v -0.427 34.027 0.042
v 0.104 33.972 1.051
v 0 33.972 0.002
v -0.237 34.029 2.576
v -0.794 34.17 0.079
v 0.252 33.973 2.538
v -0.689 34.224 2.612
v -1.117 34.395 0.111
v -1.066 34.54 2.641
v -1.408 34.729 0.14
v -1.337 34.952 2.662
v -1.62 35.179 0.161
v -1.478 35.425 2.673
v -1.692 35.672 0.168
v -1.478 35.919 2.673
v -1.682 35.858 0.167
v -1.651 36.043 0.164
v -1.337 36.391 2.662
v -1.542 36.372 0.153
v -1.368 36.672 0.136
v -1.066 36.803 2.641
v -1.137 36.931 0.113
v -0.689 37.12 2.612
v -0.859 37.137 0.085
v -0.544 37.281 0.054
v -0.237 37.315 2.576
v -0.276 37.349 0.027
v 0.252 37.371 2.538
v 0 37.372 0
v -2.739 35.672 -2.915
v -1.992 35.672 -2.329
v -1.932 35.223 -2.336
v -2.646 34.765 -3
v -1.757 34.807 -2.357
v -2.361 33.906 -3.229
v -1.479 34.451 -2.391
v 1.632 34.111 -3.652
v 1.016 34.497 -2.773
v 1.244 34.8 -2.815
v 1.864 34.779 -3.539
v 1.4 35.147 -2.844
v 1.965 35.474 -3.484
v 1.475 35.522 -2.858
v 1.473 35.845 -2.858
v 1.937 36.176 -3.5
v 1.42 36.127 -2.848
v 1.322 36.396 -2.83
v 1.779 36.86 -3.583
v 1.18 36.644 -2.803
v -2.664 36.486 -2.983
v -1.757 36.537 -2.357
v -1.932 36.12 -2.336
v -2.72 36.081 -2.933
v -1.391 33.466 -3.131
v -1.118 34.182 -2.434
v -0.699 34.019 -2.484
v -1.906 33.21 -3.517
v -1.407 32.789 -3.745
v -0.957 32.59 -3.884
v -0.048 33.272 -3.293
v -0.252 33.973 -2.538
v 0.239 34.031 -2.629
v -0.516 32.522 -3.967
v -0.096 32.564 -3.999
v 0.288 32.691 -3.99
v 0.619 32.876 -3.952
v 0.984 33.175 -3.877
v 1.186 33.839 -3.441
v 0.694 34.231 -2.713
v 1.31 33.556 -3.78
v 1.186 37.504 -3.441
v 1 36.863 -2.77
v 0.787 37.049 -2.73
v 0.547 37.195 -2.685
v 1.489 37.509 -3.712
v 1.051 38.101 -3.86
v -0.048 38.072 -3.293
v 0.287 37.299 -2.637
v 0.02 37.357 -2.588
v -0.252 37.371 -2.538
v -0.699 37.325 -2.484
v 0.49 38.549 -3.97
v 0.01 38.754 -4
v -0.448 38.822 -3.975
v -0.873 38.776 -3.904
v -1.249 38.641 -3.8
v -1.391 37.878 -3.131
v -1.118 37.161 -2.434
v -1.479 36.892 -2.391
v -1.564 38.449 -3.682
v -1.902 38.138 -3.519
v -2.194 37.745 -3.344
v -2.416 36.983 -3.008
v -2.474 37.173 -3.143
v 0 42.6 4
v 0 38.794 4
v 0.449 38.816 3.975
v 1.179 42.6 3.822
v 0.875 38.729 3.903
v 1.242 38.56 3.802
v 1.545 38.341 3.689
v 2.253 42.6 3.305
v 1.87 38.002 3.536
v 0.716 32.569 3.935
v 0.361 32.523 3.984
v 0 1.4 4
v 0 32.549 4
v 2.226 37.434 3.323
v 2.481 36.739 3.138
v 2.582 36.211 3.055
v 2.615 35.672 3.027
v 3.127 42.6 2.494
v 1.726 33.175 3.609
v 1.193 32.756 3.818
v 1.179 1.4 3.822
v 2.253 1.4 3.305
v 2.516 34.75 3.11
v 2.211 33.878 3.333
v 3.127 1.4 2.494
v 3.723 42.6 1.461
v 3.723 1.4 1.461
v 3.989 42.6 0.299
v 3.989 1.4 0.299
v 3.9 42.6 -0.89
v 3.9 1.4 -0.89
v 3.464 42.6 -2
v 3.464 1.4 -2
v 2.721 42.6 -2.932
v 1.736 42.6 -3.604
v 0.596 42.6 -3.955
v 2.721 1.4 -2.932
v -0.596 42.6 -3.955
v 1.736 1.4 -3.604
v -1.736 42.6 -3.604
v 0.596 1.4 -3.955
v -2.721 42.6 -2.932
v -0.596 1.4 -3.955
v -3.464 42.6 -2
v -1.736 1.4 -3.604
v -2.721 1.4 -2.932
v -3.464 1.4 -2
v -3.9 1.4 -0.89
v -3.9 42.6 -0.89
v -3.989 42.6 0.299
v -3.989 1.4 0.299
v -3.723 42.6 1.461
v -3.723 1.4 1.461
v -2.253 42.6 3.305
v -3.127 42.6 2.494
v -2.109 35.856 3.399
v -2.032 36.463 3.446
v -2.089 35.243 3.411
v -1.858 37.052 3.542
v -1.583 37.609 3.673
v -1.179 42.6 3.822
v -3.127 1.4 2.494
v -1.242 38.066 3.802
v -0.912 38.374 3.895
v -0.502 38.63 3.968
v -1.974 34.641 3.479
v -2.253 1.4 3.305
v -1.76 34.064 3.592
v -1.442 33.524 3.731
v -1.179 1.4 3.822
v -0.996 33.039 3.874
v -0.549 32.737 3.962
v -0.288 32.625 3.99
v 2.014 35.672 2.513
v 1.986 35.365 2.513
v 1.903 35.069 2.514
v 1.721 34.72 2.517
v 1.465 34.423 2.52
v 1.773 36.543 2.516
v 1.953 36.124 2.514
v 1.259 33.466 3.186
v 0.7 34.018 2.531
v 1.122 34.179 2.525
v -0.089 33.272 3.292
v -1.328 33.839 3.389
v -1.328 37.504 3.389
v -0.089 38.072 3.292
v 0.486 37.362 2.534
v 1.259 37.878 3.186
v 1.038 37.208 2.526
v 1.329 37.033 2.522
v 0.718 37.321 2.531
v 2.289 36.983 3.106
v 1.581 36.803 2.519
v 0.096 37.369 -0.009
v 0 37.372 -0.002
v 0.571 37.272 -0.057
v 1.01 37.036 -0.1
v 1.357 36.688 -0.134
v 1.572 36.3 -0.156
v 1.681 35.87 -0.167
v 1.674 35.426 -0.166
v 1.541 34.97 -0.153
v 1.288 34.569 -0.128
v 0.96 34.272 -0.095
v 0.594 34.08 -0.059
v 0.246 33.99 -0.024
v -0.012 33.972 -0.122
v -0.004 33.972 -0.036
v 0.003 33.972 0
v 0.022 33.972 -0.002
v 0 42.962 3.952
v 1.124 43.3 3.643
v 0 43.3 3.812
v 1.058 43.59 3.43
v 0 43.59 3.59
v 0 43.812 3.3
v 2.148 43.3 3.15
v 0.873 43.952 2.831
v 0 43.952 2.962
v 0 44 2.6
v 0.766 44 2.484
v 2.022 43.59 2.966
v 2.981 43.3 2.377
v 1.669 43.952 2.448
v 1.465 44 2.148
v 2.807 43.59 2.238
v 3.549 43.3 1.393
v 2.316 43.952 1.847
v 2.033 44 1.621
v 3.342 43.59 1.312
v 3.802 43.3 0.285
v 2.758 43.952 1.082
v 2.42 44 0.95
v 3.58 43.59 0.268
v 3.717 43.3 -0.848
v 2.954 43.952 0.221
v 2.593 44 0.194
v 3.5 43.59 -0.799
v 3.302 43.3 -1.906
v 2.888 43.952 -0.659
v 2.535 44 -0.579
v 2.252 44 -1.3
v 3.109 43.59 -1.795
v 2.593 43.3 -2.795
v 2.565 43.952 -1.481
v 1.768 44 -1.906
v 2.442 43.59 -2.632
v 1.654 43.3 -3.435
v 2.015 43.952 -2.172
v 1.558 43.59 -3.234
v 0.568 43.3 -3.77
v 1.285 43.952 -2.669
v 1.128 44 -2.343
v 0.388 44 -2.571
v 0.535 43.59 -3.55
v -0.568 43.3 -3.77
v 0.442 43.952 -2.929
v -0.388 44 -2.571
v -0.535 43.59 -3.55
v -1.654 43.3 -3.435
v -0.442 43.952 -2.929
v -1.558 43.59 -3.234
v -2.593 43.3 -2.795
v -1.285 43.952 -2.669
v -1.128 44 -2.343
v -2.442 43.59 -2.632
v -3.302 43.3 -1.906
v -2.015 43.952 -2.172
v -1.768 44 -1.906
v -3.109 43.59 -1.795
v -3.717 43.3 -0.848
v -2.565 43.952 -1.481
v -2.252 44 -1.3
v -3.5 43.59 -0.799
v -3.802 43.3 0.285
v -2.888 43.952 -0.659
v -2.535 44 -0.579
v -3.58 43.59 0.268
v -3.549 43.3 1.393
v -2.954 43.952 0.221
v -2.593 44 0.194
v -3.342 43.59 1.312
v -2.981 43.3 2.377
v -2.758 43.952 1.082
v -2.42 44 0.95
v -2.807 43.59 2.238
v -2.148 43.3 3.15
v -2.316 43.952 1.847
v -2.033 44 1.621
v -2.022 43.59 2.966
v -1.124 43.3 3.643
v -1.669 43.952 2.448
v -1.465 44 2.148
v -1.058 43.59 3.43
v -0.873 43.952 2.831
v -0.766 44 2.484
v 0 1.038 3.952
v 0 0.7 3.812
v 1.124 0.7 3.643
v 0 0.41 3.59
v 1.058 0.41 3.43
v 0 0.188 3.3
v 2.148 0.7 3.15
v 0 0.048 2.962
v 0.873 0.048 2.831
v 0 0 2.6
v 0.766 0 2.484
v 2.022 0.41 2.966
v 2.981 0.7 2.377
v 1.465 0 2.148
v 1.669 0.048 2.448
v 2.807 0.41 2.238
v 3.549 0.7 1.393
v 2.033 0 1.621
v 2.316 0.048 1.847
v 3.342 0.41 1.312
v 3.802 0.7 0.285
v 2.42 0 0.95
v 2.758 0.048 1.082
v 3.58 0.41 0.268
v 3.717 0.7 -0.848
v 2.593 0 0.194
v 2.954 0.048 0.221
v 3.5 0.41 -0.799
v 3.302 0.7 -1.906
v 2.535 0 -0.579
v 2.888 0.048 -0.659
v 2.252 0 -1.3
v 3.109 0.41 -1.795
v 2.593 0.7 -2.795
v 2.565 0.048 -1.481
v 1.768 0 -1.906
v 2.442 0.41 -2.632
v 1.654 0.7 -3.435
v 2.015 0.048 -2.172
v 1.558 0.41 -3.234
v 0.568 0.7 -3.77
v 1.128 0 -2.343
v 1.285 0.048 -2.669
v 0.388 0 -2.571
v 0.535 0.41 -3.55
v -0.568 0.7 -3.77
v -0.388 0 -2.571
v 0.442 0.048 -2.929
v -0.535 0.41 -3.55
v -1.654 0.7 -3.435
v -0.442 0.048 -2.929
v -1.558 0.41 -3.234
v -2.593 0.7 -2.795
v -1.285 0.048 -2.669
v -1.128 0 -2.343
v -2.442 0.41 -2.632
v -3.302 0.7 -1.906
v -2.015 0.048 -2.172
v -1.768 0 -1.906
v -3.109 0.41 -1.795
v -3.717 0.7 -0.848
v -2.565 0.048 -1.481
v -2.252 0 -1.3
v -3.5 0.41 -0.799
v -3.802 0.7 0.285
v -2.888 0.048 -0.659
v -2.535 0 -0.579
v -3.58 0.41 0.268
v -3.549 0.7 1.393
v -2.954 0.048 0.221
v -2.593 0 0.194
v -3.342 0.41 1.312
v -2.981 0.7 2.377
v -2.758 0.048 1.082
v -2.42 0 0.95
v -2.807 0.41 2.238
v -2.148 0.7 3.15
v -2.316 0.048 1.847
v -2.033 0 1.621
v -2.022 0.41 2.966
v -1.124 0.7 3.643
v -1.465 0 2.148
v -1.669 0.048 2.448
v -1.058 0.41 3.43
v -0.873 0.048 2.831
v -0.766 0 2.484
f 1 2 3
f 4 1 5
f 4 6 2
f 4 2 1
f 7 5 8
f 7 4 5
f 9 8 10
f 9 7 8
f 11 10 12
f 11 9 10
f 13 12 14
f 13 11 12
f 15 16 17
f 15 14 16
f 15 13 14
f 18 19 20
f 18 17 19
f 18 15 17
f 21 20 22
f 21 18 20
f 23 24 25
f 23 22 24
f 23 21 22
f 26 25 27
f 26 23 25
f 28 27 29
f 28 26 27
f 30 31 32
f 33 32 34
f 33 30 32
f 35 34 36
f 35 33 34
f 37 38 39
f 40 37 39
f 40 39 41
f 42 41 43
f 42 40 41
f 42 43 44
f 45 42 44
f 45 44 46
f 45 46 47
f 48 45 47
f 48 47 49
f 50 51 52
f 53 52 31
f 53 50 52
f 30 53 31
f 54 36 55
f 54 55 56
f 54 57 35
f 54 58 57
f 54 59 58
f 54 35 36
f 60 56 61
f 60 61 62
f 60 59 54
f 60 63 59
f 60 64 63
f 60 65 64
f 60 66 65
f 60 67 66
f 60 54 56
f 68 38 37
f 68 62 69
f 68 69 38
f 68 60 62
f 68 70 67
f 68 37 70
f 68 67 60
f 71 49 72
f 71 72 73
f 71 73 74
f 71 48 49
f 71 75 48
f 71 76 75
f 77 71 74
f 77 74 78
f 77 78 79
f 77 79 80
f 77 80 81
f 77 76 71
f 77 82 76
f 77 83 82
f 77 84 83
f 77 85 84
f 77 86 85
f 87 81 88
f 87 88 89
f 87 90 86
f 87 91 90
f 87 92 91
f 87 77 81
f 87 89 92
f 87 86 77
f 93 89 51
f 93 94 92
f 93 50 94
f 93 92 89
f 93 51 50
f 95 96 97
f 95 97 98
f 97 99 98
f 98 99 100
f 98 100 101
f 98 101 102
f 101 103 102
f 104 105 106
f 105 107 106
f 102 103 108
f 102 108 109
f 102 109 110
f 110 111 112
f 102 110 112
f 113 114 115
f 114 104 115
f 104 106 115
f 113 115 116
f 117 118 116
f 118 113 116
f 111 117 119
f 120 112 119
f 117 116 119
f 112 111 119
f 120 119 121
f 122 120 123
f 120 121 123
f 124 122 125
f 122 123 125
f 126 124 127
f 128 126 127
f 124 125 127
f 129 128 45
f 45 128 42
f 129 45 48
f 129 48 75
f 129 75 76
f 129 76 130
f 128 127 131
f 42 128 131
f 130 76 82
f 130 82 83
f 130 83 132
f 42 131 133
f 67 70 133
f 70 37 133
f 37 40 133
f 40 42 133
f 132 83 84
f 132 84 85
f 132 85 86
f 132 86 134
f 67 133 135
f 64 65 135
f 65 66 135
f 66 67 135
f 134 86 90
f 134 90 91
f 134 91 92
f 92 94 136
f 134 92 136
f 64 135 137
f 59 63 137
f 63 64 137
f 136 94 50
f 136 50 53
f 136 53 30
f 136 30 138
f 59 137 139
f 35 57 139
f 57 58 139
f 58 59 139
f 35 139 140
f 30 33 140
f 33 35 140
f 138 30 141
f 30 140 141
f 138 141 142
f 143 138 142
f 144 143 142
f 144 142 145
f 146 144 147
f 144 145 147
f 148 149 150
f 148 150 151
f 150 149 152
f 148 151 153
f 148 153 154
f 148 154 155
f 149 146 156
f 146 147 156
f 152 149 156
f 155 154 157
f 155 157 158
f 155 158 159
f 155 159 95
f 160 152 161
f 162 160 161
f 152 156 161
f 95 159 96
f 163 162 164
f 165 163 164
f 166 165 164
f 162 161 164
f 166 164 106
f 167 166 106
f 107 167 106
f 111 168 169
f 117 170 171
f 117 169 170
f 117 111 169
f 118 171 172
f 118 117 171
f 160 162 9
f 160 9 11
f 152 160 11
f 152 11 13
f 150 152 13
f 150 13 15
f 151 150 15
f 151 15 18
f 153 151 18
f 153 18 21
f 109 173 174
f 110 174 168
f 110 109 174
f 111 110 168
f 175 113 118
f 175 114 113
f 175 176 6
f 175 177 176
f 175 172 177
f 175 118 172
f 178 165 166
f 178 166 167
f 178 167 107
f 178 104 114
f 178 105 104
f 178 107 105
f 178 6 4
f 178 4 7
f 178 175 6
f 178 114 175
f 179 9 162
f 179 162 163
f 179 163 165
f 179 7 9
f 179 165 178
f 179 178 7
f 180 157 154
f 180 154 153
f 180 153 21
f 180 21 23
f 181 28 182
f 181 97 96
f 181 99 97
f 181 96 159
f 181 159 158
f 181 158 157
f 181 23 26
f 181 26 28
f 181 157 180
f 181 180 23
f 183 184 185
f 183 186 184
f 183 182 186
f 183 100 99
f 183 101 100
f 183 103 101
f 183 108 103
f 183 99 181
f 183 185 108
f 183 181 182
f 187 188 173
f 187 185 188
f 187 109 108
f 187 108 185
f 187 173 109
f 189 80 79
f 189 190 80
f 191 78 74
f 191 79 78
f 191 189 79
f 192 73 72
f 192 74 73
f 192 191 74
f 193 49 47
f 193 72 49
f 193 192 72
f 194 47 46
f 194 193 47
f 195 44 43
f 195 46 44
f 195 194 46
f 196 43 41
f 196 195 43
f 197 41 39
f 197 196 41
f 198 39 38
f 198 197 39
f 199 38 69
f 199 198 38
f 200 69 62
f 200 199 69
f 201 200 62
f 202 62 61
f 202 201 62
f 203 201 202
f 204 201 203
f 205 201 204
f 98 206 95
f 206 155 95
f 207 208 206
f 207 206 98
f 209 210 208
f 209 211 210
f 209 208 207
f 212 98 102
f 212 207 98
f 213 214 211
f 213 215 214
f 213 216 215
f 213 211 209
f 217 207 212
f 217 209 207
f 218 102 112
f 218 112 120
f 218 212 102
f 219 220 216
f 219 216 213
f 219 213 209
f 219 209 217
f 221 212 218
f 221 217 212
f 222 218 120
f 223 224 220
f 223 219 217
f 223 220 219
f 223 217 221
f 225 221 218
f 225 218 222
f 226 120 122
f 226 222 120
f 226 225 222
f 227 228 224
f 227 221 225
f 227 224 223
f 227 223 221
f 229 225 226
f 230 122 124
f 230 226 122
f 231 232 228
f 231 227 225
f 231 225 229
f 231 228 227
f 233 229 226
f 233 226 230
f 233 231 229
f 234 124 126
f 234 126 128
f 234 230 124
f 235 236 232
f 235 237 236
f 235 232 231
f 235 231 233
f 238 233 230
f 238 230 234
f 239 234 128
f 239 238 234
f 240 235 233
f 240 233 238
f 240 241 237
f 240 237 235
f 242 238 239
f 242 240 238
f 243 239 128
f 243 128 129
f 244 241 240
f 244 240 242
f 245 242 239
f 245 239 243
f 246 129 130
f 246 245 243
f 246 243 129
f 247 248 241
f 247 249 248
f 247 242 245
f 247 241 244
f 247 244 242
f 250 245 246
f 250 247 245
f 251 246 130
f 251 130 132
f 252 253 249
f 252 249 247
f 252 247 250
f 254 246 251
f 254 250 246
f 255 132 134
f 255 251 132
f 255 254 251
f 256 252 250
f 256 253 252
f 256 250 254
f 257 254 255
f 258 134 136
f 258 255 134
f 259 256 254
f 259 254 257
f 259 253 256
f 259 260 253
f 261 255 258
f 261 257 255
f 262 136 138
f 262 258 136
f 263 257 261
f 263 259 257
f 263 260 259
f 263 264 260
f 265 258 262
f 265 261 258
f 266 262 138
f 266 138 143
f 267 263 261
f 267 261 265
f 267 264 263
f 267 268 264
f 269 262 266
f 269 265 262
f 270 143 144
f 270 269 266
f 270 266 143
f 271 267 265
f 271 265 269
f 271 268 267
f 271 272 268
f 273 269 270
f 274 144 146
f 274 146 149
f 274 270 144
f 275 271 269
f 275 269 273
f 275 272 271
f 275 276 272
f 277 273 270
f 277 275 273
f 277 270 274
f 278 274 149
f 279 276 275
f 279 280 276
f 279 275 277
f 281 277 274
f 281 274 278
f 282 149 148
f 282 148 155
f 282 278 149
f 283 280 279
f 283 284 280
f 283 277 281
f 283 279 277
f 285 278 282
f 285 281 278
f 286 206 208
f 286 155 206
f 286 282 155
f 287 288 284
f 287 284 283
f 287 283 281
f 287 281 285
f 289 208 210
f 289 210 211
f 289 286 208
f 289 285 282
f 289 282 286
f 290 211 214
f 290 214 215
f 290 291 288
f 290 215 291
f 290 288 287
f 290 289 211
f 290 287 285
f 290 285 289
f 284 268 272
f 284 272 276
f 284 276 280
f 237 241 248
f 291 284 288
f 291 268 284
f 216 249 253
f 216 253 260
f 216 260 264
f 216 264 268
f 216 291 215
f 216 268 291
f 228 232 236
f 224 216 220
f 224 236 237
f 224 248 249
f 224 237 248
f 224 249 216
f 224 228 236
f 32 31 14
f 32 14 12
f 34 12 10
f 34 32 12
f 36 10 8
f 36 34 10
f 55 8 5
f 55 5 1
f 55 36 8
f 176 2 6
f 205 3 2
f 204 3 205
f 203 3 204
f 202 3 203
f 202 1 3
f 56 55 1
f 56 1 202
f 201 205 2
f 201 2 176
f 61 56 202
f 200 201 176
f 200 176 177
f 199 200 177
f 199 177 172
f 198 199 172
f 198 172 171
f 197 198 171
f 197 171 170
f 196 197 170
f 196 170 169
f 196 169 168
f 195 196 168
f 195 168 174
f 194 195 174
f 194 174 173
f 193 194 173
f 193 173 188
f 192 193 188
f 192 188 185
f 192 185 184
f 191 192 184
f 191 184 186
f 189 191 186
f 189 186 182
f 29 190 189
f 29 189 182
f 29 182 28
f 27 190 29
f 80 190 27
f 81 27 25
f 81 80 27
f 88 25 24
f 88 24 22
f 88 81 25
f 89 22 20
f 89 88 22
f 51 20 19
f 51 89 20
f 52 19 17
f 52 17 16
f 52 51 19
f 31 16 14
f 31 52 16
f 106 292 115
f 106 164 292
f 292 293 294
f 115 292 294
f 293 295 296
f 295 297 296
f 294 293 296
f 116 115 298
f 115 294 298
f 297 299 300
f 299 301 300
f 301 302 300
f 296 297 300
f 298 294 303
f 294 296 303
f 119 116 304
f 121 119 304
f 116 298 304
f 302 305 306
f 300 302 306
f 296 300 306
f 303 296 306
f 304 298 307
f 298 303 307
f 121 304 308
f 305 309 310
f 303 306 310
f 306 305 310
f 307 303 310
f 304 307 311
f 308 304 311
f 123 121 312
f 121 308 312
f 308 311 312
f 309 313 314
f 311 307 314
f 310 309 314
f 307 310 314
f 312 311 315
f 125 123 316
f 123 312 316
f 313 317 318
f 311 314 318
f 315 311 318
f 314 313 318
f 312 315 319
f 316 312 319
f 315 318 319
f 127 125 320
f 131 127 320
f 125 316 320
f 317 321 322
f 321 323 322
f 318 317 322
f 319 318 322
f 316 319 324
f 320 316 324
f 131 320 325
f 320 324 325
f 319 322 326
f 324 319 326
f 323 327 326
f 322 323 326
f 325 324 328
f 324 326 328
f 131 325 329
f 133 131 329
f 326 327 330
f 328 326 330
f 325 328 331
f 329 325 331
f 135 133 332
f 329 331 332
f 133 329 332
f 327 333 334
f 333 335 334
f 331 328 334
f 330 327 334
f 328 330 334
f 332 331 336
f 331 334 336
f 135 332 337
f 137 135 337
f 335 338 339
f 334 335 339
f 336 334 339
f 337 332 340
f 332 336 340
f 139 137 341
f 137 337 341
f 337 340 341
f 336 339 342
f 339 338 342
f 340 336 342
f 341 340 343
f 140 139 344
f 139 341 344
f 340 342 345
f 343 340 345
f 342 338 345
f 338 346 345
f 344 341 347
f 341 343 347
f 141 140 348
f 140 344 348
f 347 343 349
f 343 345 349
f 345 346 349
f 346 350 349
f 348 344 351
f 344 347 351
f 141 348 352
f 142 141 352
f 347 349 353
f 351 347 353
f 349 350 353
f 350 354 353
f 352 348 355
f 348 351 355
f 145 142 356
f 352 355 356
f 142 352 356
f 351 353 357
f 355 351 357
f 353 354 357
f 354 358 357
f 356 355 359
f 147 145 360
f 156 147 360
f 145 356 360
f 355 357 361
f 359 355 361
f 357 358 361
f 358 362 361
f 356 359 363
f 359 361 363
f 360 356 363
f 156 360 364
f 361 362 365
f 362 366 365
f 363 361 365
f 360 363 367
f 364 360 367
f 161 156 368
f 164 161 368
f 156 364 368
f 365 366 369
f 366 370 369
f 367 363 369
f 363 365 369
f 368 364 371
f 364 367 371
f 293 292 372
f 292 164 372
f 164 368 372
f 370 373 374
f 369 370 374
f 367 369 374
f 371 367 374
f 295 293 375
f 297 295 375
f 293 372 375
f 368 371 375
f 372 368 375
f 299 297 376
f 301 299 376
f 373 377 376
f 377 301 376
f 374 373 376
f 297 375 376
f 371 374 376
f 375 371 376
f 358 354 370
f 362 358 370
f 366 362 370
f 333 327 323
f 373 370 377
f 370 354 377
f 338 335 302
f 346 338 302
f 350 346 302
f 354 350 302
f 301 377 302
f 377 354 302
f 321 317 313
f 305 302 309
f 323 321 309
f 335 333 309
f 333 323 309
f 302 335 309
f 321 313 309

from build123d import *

# Parameters (mm, degrees)
SKETCH1_R           = 4
BOSS_EXTRUDE1_DEPTH = 44
FILLET3_R           = 1.4


with BuildPart() as part:
    # Sketch1 → Boss-Extrude1 (new body)
    with BuildSketch(Plane(origin=(0, 0, 0), x_dir=(1, 0, 0), z_dir=(0, 1, 0))):
        with Locations(Location((0, 0, 0), (0, 0, 270))):
            Circle(SKETCH1_R)
    extrude(amount=BOSS_EXTRUDE1_DEPTH)

    # Fillet3
    fillet3_edges = [part.edges().sort_by_distance(p)[0] for p in [
        (0, 0, -4),
        (0, 44, -4),
    ]]
    fillet(fillet3_edges, radius=FILLET3_R)

    # Sketch6 → CSK for M3 Oval Head Machine Screw1 (revolve, cut)
    with BuildSketch(Plane(origin=(0.311679131, 35.67179677, 3.987838527), x_dir=(0.9969596318094598, 0, -0.07791978274062668), z_dir=(0, 1, 0))):
        Polygon((0, 0), (0, 8), (1.725, 8), (1.7, 7.975), (1.7, 1.45), (3.15, 0), align=None)
    revolve(axis=Axis((0.806469751, 35.67179677, 10.318532189), (-0.07791978274062668, 0, -0.9969596318094597)), mode=Mode.SUBTRACT)

    # Sketch6 at point 2 (carried to point 2, square into its face) → CSK for M3 Oval Head Machine Screw1 at 2 (revolve, cut)
    with BuildSketch(Plane(origin=(-0.477245613, 35.67179677, -3.97142753), x_dir=(-0.992856932, 0, 0.119310992), z_dir=(0, 1, 0))):
        Polygon((0, 0), (0, 8), (1.725, 8), (1.7, 7.975), (1.7, 1.45), (3.15, 0), align=None)
    revolve(axis=Axis((-1.234870411, 35.67179677, -10.276069047), (0.119310992, 0, 0.992856932)), mode=Mode.SUBTRACT)


solid = part.part
